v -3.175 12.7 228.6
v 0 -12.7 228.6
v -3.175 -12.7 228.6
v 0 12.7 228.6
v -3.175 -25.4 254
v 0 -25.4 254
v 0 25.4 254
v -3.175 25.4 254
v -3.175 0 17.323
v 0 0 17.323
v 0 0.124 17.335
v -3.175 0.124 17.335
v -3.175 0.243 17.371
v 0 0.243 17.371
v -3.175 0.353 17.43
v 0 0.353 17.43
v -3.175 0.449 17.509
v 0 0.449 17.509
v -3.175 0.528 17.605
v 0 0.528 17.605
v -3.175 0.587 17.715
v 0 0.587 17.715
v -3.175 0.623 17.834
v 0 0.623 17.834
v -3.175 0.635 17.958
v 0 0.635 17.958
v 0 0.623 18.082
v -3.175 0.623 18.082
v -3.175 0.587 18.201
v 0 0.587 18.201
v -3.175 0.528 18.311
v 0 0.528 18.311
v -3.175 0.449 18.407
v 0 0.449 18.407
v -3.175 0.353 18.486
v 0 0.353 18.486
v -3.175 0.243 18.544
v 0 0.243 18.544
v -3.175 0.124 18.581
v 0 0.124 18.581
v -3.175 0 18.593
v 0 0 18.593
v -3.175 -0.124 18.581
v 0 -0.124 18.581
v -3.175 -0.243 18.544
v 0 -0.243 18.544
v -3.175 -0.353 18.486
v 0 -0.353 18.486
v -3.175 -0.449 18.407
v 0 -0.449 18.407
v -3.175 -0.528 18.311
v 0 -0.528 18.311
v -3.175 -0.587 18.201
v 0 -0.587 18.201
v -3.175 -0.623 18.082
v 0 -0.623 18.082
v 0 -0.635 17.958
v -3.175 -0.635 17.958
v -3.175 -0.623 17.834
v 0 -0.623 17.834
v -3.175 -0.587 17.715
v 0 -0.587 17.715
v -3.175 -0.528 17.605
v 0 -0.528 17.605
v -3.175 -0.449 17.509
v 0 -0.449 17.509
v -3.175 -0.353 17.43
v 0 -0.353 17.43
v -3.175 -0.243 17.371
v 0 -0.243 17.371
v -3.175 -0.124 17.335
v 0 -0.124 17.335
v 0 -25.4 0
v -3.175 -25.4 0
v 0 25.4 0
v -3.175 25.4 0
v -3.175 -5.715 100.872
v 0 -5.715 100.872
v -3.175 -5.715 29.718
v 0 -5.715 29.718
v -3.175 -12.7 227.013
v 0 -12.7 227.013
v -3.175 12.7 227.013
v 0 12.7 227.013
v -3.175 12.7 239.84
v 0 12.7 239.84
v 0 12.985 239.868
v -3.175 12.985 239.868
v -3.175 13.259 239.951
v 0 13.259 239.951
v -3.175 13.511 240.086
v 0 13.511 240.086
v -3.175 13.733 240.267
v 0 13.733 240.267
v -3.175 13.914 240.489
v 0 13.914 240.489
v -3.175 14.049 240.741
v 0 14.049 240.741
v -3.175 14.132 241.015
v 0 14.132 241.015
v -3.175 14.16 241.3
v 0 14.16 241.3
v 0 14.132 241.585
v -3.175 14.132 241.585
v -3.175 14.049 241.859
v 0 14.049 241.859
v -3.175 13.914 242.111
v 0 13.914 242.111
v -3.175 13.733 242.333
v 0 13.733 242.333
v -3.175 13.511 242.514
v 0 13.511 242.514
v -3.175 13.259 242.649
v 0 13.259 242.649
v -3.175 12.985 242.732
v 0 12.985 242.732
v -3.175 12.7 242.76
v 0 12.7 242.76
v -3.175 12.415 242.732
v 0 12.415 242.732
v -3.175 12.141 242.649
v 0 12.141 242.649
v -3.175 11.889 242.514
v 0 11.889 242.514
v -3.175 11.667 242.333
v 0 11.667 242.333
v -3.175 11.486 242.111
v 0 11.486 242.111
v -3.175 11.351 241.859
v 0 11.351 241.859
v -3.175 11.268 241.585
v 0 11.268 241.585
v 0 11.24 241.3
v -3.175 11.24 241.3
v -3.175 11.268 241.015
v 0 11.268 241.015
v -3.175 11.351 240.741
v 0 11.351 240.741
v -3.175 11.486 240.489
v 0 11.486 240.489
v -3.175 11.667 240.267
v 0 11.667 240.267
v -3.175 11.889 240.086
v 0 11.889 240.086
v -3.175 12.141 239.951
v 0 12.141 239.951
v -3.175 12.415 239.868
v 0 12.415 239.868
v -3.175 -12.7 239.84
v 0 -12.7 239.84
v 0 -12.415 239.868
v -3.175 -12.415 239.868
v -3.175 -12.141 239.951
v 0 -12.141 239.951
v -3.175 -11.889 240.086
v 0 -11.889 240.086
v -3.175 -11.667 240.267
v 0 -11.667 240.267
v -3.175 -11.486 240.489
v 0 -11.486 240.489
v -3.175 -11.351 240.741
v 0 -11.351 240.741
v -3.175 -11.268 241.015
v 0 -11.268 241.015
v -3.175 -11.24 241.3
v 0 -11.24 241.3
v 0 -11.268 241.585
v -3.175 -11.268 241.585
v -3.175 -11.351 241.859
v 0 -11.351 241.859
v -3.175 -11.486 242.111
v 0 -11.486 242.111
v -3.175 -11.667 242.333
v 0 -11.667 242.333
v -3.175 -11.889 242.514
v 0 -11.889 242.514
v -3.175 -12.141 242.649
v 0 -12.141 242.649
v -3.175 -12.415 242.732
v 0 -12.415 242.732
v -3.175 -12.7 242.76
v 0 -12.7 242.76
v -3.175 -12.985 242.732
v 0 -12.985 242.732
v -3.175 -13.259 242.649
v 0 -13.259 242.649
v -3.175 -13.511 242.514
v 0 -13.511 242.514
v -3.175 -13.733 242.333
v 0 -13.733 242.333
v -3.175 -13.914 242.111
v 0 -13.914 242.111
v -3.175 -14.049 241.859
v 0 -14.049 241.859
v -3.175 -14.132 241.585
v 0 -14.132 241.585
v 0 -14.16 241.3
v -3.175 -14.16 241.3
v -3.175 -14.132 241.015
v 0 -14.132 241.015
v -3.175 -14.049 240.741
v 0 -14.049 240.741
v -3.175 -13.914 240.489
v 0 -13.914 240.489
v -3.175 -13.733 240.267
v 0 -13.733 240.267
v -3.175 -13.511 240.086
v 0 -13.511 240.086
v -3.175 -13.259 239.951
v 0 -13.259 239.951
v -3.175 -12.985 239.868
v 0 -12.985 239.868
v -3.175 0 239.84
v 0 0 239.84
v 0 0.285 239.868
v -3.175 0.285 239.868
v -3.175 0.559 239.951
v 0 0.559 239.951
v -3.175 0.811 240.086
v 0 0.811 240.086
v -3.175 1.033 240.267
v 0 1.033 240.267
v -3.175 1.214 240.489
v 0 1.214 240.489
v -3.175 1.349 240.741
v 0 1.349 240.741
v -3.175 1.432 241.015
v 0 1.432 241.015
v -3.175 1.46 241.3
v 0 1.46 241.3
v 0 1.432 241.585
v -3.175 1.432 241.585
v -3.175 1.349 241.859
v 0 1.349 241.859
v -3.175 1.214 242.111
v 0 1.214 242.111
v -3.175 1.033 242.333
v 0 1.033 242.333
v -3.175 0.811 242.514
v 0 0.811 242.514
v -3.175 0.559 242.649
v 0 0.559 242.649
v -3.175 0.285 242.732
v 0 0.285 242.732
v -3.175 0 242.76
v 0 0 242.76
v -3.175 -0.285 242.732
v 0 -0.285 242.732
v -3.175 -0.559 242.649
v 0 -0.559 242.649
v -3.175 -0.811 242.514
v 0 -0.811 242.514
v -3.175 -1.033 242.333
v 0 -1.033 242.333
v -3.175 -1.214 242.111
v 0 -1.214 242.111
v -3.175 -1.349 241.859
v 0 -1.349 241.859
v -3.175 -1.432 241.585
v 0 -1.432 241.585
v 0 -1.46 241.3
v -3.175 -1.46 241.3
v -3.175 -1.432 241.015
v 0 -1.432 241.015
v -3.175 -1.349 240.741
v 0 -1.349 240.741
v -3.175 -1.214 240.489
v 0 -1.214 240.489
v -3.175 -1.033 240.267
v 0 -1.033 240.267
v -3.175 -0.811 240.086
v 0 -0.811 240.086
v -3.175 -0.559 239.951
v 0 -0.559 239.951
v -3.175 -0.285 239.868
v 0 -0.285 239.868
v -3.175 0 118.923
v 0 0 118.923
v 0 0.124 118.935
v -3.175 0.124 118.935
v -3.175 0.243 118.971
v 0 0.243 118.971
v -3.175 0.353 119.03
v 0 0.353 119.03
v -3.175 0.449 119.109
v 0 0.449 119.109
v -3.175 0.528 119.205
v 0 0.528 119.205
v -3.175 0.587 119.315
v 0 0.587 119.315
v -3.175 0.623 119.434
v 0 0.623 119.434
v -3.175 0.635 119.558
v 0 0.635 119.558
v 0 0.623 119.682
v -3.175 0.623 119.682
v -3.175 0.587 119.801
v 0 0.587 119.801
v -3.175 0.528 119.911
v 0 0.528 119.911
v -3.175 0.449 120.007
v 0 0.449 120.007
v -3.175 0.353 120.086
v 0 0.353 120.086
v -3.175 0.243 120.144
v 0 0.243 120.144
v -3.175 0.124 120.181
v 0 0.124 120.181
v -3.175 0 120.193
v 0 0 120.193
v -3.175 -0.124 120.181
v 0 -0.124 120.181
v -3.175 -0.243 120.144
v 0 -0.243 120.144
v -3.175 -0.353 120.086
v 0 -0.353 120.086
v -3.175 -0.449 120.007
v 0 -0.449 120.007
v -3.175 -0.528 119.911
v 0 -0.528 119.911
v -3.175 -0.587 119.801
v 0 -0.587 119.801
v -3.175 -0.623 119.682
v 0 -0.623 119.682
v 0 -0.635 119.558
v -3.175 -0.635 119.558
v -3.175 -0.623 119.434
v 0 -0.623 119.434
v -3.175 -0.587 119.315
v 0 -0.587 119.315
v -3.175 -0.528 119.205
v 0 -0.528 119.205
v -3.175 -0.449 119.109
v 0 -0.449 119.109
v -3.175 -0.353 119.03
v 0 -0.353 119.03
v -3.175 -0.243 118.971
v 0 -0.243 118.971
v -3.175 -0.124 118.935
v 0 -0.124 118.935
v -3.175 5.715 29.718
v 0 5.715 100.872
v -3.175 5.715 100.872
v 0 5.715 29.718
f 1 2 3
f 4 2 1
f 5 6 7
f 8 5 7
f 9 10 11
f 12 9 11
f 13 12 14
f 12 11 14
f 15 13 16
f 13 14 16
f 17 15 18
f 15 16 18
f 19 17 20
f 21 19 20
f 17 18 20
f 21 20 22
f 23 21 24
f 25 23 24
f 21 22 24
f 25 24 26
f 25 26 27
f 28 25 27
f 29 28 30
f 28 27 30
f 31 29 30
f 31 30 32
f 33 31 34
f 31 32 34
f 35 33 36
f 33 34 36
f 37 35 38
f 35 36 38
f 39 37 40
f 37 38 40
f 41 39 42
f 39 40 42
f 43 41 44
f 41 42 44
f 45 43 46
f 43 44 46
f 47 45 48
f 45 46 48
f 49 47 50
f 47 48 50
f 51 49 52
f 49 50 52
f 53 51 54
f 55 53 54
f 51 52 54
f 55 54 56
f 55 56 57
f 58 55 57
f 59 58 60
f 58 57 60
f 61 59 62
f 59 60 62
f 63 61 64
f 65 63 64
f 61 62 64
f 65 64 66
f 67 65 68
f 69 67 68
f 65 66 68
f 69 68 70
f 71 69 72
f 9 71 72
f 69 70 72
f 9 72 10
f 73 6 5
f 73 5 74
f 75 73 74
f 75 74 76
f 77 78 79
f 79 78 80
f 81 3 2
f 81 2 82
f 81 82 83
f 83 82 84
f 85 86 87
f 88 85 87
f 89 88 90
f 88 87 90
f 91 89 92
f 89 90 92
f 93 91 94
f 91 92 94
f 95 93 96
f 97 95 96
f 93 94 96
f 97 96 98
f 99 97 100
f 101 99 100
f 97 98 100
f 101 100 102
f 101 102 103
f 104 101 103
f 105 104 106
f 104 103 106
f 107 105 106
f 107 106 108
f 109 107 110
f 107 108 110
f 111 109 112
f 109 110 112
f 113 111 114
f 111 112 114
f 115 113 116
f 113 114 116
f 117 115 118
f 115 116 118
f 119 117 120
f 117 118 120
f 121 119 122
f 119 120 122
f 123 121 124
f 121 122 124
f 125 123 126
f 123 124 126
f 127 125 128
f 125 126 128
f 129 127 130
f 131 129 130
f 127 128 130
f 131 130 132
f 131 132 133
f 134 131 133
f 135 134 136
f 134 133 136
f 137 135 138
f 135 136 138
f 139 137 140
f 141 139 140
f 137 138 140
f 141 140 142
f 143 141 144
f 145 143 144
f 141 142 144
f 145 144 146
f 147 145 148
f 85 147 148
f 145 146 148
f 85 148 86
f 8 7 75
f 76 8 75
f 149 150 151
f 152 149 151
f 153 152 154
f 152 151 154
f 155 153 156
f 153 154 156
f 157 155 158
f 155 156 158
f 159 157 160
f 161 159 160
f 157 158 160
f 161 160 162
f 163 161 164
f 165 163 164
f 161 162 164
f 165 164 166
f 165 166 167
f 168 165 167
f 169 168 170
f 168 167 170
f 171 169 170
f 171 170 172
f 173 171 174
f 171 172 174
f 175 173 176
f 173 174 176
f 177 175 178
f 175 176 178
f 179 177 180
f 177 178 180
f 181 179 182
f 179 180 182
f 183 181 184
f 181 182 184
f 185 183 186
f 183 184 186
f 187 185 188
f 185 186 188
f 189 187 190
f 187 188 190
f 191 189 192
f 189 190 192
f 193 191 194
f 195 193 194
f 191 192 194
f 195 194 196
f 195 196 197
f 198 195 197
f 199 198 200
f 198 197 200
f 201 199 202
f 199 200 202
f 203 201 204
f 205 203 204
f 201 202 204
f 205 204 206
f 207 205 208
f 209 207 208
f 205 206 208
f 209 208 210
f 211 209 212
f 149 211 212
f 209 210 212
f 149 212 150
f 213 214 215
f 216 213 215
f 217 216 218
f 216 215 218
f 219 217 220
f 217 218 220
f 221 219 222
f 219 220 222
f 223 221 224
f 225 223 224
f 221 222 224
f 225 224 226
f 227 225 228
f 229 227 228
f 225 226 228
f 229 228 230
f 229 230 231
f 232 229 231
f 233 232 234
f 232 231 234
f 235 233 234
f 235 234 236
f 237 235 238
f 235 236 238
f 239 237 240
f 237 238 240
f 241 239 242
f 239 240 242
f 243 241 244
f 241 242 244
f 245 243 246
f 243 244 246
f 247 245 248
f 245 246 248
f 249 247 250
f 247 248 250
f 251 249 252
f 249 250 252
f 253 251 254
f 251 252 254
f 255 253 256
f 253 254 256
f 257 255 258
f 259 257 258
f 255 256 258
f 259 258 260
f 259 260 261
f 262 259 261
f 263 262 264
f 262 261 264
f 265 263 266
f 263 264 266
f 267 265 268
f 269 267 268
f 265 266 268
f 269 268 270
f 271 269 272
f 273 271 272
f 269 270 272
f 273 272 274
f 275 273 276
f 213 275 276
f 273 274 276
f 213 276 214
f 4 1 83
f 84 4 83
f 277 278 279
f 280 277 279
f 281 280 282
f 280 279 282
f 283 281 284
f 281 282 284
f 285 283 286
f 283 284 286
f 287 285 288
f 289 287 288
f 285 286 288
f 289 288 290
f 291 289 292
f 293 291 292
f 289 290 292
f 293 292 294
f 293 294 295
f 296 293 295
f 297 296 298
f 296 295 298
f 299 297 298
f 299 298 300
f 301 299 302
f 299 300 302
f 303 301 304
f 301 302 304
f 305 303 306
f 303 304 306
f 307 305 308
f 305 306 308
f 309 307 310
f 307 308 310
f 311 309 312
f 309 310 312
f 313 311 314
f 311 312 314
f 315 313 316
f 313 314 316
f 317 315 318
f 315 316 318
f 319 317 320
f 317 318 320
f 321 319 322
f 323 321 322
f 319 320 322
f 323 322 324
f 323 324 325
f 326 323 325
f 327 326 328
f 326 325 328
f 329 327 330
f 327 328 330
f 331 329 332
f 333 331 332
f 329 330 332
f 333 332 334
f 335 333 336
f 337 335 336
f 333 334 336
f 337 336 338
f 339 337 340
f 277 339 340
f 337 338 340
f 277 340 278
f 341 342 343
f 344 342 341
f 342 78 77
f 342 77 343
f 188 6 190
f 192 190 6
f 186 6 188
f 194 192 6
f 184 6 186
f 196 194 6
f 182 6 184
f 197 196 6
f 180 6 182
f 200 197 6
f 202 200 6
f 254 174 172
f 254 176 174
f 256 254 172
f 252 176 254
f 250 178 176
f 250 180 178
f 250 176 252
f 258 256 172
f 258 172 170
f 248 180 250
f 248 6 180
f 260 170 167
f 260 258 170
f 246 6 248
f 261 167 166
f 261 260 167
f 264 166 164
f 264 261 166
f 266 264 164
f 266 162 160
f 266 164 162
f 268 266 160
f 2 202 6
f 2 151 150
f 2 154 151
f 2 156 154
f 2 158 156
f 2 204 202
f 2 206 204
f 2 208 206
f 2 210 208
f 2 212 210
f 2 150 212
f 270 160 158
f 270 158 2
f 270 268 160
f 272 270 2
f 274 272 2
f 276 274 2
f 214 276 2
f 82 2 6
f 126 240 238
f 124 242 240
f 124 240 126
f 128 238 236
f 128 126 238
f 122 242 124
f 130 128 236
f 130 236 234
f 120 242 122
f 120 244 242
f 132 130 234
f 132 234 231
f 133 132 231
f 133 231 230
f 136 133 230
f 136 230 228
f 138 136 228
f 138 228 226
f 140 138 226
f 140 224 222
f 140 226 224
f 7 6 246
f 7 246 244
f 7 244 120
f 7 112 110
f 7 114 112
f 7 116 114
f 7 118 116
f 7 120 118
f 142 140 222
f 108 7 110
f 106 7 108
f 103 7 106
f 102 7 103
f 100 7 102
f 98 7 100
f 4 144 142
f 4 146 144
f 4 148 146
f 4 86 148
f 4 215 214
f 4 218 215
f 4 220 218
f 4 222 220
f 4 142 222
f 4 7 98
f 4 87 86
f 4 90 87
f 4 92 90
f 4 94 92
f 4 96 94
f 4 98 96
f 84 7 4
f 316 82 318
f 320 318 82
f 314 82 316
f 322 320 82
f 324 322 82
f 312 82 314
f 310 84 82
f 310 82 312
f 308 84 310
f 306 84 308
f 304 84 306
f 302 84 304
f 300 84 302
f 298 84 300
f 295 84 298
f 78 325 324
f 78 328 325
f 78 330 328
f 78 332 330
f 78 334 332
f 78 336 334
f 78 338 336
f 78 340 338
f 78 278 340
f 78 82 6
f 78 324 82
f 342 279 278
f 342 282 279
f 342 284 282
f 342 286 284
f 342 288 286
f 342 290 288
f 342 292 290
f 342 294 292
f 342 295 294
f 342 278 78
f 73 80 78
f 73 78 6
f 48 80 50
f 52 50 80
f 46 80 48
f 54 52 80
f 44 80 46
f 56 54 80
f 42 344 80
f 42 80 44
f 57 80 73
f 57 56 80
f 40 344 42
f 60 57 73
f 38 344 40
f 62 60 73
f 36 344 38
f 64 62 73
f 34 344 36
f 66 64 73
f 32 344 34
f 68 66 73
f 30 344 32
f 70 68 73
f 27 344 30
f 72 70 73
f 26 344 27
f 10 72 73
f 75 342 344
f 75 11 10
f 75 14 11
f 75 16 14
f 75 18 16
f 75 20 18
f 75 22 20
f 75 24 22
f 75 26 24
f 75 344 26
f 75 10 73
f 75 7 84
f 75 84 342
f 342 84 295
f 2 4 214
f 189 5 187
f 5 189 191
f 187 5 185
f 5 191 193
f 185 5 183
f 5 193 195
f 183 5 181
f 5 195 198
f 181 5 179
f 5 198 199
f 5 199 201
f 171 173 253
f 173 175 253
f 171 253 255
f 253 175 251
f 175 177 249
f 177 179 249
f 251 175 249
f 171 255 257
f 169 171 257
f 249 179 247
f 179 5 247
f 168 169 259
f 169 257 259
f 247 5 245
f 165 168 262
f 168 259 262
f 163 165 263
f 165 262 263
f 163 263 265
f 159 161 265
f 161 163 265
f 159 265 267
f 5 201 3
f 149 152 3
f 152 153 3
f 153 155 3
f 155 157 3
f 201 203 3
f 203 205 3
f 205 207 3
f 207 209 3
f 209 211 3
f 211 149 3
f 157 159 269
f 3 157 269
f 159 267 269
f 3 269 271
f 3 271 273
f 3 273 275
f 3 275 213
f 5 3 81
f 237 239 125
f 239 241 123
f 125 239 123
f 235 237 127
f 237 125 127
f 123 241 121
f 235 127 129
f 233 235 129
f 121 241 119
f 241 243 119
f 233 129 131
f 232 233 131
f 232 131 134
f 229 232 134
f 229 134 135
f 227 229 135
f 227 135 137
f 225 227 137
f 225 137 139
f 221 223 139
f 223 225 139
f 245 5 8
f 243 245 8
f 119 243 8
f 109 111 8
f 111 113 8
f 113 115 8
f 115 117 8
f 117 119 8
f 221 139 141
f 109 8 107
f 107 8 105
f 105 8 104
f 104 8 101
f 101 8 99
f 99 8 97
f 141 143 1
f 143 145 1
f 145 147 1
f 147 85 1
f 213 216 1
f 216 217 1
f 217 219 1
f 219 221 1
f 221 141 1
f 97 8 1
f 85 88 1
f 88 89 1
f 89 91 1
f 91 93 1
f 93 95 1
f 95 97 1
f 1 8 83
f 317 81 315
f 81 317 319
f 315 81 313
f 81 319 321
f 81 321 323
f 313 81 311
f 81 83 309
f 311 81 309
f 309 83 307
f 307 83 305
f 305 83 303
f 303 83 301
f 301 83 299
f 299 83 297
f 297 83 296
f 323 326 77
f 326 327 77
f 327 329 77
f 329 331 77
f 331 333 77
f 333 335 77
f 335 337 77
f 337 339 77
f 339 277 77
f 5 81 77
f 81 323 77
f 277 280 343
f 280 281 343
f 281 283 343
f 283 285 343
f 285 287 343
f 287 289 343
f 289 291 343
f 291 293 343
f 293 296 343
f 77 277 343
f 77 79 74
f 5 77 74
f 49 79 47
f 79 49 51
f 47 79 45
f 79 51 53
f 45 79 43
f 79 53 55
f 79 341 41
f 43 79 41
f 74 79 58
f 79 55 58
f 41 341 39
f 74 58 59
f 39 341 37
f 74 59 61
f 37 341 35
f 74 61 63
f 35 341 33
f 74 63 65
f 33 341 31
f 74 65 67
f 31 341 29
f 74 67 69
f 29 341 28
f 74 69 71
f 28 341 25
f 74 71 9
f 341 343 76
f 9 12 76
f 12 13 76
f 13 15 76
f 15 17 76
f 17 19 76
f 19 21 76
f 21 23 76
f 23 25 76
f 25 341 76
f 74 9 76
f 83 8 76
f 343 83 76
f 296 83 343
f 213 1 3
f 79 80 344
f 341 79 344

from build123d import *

# Parameters (mm, degrees)
SKETCH1_W           = 254
SKETCH1_H           = 50.8
SKETCH1_R           = 0.635
SKETCH1_R_2         = 1.4605
SKETCH1_W_2         = 71.154066826
SKETCH1_H_2         = 11.43
SKETCH1_W_3         = 1.5875
SKETCH1_H_3         = 25.4
BOSS_EXTRUDE1_DEPTH = 3.175


with BuildPart() as part:
    # Sketch1 → Boss-Extrude1 (new body)
    with BuildSketch(Plane(origin=(0, 0, 0), x_dir=(0, 0, -1), z_dir=(1, 0, 0))):
        with Locations((-127, 0)):
            Rectangle(SKETCH1_W, SKETCH1_H)
        with Locations((-17.9578, 0)):
            Circle(SKETCH1_R, mode=Mode.SUBTRACT)
        with Locations((-119.5578, 0)):
            Circle(SKETCH1_R, mode=Mode.SUBTRACT)
        with Locations((-241.3, 0)):
            Circle(SKETCH1_R_2, mode=Mode.SUBTRACT)
        with Locations((-241.3, 12.7)):
            Circle(SKETCH1_R_2, mode=Mode.SUBTRACT)
        with Locations((-241.3, -12.7)):
            Circle(SKETCH1_R_2, mode=Mode.SUBTRACT)
        with Locations((-65.295033413, 0)):
            Rectangle(SKETCH1_W_2, SKETCH1_H_2, mode=Mode.SUBTRACT)
        with Locations((-227.80625, 0)):
            Rectangle(SKETCH1_W_3, SKETCH1_H_3, mode=Mode.SUBTRACT)
    extrude(amount=-BOSS_EXTRUDE1_DEPTH)


solid = part.part
